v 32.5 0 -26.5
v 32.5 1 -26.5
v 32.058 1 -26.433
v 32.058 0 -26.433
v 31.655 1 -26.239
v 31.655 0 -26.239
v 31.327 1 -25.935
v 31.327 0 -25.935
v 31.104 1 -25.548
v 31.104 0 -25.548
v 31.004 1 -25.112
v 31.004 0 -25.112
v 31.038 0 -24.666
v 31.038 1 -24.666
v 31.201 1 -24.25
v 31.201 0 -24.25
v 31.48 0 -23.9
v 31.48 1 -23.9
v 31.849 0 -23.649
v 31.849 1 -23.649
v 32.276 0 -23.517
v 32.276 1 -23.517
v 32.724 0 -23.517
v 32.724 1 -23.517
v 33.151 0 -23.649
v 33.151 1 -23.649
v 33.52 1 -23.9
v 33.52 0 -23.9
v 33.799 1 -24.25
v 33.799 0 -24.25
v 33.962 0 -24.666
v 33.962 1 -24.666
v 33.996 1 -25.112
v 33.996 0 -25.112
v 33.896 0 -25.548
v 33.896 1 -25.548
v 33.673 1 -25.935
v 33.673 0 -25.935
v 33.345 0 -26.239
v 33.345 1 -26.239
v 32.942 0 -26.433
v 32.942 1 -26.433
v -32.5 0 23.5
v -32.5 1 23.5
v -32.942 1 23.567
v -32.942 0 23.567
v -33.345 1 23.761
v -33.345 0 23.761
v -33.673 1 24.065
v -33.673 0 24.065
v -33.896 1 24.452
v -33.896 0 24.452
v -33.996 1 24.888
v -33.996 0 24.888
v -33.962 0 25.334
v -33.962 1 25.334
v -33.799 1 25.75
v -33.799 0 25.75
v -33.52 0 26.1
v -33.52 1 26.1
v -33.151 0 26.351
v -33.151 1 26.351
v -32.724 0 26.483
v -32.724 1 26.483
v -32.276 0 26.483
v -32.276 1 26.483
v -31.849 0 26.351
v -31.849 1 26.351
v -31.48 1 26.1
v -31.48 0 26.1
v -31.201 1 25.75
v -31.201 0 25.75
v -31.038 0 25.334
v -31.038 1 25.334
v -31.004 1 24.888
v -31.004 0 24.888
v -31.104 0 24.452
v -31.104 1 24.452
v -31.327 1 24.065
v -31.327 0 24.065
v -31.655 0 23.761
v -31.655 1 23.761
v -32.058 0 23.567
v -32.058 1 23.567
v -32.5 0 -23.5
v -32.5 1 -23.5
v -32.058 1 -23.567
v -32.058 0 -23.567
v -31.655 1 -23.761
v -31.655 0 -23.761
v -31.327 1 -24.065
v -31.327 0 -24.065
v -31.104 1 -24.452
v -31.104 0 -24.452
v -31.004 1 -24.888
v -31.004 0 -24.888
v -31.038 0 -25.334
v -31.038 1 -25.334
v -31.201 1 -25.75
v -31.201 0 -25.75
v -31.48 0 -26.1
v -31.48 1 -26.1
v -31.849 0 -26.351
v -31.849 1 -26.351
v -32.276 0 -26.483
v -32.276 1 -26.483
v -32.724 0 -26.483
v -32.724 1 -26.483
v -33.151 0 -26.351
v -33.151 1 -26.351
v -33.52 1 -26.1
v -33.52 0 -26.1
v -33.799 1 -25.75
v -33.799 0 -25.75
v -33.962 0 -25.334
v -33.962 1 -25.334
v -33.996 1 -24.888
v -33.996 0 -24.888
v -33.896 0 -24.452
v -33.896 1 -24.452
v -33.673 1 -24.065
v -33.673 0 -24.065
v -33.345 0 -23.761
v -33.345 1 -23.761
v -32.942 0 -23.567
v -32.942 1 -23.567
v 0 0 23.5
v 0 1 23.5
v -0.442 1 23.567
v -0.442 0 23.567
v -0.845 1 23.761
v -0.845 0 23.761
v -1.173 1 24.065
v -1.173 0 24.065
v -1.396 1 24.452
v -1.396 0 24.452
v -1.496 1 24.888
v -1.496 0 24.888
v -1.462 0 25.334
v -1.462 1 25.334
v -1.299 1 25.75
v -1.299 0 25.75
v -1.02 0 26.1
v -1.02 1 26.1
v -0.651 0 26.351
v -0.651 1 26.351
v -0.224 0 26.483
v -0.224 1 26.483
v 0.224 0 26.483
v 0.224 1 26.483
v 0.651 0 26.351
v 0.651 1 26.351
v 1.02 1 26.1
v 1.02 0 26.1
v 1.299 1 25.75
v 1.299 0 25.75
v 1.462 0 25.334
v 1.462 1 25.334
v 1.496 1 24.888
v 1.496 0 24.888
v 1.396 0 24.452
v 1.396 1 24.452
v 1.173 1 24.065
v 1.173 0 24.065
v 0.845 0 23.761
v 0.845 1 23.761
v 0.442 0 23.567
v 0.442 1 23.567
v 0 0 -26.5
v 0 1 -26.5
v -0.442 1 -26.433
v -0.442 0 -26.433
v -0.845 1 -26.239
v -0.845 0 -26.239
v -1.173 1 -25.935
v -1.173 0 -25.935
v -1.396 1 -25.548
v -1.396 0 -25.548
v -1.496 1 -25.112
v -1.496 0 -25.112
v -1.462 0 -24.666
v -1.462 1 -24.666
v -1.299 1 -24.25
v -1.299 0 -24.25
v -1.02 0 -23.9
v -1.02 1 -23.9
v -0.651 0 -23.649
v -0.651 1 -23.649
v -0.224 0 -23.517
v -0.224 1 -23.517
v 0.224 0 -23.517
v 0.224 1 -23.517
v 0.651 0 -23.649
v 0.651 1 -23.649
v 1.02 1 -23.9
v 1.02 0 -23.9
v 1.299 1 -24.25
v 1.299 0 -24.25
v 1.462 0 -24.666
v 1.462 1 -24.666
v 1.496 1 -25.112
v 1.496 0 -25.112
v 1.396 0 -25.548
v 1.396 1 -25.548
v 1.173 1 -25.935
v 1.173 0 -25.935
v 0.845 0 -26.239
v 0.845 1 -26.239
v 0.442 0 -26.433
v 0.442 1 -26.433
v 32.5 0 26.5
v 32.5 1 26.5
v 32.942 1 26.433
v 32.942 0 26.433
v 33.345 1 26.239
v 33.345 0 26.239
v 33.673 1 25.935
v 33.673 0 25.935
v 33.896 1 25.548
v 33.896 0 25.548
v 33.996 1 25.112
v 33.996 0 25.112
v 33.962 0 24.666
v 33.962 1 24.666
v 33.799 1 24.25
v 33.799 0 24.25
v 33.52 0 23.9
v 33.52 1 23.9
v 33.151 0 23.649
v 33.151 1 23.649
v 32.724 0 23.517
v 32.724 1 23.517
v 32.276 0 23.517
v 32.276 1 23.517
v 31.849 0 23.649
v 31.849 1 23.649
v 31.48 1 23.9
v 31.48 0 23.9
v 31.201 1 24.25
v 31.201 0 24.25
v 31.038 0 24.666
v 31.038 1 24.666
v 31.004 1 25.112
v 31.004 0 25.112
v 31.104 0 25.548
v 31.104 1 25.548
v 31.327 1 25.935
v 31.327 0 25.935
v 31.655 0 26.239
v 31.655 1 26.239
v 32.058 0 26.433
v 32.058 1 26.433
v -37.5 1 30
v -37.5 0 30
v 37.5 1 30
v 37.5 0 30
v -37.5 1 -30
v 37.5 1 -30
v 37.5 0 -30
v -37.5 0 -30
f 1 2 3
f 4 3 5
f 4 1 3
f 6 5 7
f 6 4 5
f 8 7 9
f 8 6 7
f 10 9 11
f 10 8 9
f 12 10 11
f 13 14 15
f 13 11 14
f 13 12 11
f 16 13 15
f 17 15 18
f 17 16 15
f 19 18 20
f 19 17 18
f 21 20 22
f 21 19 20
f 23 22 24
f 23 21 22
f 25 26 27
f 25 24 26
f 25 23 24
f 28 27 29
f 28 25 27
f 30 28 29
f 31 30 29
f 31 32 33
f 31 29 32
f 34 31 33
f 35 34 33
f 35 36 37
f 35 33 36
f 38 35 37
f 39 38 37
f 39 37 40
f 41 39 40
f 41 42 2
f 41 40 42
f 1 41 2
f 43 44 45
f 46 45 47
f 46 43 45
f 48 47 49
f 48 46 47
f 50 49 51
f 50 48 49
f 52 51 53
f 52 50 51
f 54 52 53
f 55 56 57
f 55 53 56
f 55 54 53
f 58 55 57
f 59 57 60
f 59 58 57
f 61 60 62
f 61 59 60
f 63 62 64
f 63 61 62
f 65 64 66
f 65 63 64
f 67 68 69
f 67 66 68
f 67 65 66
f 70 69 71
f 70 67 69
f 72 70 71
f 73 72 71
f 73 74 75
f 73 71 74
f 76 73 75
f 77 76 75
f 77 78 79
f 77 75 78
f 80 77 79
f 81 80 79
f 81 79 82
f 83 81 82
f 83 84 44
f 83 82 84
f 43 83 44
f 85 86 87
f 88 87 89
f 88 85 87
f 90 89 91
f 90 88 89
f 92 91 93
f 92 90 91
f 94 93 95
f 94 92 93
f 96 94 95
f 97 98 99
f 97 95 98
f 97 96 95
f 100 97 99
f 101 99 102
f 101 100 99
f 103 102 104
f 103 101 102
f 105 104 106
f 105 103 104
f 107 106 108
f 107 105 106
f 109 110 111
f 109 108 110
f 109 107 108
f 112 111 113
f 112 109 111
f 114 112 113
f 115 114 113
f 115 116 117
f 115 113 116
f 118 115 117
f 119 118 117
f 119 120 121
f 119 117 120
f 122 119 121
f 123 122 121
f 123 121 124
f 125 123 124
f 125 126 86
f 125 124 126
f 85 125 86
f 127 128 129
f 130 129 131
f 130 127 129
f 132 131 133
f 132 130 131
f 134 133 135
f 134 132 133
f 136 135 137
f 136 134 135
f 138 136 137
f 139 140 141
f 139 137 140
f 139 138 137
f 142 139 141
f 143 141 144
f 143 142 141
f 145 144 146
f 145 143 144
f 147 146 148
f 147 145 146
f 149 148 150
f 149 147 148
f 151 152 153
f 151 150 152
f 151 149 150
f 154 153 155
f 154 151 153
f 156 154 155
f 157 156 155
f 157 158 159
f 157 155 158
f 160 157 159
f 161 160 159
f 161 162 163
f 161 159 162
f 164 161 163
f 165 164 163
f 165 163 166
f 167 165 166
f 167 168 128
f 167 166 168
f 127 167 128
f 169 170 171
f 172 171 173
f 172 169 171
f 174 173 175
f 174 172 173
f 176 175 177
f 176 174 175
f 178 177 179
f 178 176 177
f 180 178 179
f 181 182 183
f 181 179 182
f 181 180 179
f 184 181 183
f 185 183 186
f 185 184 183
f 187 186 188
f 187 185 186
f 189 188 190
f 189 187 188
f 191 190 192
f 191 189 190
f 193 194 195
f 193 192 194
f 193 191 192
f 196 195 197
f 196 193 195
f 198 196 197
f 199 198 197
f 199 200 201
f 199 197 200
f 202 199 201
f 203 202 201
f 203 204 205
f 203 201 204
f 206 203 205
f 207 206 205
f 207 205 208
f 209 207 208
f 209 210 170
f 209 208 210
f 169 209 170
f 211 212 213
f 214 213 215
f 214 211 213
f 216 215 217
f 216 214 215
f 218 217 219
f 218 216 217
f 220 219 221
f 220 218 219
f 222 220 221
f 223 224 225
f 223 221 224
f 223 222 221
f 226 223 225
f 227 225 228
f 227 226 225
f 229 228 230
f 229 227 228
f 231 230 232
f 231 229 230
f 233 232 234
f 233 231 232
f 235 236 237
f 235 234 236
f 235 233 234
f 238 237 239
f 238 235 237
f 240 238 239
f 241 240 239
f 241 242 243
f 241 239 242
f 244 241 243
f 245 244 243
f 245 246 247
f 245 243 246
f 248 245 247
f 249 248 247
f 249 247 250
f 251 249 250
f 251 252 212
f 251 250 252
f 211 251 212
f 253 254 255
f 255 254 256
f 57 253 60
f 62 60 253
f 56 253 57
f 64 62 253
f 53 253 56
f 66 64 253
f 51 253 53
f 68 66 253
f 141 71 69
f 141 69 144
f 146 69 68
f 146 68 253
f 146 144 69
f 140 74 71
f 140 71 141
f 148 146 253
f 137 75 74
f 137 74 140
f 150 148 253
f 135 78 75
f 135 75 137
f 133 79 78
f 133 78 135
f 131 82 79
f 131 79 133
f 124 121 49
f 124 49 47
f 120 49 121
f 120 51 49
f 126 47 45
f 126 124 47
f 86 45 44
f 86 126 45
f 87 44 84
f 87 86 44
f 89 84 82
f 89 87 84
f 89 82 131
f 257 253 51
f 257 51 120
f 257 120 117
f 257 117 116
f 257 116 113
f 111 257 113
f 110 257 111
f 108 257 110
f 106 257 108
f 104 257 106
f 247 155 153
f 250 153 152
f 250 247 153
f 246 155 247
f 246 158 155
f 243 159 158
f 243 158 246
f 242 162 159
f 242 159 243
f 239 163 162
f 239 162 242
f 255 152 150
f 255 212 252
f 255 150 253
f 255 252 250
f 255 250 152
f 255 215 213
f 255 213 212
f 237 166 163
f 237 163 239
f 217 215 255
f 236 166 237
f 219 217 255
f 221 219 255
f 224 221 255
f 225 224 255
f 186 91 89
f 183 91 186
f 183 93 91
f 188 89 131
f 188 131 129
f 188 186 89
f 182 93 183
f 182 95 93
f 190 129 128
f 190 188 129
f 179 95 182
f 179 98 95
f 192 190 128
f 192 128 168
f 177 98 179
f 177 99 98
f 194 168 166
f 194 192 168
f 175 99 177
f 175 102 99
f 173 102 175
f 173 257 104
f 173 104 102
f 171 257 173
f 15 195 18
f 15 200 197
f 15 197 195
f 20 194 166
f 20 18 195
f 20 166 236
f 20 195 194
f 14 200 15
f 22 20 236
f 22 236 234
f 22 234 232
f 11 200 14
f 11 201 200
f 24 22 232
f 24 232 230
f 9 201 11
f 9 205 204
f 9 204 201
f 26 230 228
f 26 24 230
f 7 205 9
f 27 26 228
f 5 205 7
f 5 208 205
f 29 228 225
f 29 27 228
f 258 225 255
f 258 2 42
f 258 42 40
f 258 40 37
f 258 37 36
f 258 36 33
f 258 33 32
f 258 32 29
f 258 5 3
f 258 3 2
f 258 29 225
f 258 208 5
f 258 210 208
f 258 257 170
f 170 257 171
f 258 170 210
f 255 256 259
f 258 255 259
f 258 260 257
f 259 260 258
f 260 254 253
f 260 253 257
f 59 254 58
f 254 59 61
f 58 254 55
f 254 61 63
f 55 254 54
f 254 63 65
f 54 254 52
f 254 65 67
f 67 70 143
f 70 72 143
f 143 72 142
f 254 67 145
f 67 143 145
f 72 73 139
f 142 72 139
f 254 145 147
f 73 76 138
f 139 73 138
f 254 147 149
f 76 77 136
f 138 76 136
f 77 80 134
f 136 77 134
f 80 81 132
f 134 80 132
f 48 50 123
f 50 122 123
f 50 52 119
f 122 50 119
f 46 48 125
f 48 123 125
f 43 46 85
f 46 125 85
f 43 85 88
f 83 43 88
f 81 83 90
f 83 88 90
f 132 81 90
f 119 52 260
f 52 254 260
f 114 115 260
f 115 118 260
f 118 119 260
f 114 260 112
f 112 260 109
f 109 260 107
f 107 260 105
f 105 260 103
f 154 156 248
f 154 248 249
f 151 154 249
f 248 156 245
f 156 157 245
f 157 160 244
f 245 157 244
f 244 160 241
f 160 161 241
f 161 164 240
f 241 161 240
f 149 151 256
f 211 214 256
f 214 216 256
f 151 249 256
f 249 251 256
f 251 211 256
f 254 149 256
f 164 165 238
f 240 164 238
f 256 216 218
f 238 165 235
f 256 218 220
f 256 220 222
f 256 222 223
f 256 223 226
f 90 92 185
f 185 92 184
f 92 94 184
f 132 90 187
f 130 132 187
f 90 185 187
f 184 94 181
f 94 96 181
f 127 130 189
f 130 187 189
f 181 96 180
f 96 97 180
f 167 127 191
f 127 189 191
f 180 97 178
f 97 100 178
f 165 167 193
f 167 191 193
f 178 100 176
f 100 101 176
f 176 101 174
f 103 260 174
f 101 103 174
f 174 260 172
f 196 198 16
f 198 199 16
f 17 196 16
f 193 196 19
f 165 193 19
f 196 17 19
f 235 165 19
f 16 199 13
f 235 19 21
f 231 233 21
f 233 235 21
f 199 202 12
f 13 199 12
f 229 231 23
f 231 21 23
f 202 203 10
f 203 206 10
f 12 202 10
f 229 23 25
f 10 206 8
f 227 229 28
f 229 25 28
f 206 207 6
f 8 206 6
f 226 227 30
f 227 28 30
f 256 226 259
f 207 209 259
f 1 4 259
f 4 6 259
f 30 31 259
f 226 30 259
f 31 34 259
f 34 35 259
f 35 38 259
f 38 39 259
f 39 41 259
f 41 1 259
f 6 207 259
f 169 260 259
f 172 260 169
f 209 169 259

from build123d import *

# Parameters (mm, degrees)
SKETCH_1_W          = 75
SKETCH_1_H          = 60
EXTRUDE_1_DEPTH     = 1
SKETCH_2_R          = 1.5
CUT_EXTRUDE_1_DEPTH = 49.033842236


with BuildPart() as part:
    # 草图1 → 凸台-拉伸1 (new body)
    with BuildSketch(Plane(origin=(0, 0, 0), x_dir=(1, 0, 0), z_dir=(0, 1, 0))):
        Rectangle(SKETCH_1_W, SKETCH_1_H)
    extrude(amount=EXTRUDE_1_DEPTH)

    # 草图2 → 切除-拉伸1 (cut, through all)
    with BuildSketch(Plane(origin=(0, 0, 0), x_dir=(1, 0, 0), z_dir=(0, 1, 0))):
        with Locations(Location((-32.5, 25, 0), (0, 0, 270))):
            Circle(SKETCH_2_R)
        with Locations(Location((-32.5, -25, 0), (0, 0, 90))):
            Circle(SKETCH_2_R)
        with Locations(Location((32.5, -25, 0), (0, 0, 270))):
            Circle(SKETCH_2_R)
        with Locations(Location((32.5, 25, 0), (0, 0, 90))):
            Circle(SKETCH_2_R)
        with Locations(Location((0, -25, 0), (0, 0, 90))):
            Circle(SKETCH_2_R)
        with Locations(Location((0, 25, 0), (0, 0, 90))):
            Circle(SKETCH_2_R)
    extrude(amount=CUT_EXTRUDE_1_DEPTH, mode=Mode.SUBTRACT)


solid = part.part
